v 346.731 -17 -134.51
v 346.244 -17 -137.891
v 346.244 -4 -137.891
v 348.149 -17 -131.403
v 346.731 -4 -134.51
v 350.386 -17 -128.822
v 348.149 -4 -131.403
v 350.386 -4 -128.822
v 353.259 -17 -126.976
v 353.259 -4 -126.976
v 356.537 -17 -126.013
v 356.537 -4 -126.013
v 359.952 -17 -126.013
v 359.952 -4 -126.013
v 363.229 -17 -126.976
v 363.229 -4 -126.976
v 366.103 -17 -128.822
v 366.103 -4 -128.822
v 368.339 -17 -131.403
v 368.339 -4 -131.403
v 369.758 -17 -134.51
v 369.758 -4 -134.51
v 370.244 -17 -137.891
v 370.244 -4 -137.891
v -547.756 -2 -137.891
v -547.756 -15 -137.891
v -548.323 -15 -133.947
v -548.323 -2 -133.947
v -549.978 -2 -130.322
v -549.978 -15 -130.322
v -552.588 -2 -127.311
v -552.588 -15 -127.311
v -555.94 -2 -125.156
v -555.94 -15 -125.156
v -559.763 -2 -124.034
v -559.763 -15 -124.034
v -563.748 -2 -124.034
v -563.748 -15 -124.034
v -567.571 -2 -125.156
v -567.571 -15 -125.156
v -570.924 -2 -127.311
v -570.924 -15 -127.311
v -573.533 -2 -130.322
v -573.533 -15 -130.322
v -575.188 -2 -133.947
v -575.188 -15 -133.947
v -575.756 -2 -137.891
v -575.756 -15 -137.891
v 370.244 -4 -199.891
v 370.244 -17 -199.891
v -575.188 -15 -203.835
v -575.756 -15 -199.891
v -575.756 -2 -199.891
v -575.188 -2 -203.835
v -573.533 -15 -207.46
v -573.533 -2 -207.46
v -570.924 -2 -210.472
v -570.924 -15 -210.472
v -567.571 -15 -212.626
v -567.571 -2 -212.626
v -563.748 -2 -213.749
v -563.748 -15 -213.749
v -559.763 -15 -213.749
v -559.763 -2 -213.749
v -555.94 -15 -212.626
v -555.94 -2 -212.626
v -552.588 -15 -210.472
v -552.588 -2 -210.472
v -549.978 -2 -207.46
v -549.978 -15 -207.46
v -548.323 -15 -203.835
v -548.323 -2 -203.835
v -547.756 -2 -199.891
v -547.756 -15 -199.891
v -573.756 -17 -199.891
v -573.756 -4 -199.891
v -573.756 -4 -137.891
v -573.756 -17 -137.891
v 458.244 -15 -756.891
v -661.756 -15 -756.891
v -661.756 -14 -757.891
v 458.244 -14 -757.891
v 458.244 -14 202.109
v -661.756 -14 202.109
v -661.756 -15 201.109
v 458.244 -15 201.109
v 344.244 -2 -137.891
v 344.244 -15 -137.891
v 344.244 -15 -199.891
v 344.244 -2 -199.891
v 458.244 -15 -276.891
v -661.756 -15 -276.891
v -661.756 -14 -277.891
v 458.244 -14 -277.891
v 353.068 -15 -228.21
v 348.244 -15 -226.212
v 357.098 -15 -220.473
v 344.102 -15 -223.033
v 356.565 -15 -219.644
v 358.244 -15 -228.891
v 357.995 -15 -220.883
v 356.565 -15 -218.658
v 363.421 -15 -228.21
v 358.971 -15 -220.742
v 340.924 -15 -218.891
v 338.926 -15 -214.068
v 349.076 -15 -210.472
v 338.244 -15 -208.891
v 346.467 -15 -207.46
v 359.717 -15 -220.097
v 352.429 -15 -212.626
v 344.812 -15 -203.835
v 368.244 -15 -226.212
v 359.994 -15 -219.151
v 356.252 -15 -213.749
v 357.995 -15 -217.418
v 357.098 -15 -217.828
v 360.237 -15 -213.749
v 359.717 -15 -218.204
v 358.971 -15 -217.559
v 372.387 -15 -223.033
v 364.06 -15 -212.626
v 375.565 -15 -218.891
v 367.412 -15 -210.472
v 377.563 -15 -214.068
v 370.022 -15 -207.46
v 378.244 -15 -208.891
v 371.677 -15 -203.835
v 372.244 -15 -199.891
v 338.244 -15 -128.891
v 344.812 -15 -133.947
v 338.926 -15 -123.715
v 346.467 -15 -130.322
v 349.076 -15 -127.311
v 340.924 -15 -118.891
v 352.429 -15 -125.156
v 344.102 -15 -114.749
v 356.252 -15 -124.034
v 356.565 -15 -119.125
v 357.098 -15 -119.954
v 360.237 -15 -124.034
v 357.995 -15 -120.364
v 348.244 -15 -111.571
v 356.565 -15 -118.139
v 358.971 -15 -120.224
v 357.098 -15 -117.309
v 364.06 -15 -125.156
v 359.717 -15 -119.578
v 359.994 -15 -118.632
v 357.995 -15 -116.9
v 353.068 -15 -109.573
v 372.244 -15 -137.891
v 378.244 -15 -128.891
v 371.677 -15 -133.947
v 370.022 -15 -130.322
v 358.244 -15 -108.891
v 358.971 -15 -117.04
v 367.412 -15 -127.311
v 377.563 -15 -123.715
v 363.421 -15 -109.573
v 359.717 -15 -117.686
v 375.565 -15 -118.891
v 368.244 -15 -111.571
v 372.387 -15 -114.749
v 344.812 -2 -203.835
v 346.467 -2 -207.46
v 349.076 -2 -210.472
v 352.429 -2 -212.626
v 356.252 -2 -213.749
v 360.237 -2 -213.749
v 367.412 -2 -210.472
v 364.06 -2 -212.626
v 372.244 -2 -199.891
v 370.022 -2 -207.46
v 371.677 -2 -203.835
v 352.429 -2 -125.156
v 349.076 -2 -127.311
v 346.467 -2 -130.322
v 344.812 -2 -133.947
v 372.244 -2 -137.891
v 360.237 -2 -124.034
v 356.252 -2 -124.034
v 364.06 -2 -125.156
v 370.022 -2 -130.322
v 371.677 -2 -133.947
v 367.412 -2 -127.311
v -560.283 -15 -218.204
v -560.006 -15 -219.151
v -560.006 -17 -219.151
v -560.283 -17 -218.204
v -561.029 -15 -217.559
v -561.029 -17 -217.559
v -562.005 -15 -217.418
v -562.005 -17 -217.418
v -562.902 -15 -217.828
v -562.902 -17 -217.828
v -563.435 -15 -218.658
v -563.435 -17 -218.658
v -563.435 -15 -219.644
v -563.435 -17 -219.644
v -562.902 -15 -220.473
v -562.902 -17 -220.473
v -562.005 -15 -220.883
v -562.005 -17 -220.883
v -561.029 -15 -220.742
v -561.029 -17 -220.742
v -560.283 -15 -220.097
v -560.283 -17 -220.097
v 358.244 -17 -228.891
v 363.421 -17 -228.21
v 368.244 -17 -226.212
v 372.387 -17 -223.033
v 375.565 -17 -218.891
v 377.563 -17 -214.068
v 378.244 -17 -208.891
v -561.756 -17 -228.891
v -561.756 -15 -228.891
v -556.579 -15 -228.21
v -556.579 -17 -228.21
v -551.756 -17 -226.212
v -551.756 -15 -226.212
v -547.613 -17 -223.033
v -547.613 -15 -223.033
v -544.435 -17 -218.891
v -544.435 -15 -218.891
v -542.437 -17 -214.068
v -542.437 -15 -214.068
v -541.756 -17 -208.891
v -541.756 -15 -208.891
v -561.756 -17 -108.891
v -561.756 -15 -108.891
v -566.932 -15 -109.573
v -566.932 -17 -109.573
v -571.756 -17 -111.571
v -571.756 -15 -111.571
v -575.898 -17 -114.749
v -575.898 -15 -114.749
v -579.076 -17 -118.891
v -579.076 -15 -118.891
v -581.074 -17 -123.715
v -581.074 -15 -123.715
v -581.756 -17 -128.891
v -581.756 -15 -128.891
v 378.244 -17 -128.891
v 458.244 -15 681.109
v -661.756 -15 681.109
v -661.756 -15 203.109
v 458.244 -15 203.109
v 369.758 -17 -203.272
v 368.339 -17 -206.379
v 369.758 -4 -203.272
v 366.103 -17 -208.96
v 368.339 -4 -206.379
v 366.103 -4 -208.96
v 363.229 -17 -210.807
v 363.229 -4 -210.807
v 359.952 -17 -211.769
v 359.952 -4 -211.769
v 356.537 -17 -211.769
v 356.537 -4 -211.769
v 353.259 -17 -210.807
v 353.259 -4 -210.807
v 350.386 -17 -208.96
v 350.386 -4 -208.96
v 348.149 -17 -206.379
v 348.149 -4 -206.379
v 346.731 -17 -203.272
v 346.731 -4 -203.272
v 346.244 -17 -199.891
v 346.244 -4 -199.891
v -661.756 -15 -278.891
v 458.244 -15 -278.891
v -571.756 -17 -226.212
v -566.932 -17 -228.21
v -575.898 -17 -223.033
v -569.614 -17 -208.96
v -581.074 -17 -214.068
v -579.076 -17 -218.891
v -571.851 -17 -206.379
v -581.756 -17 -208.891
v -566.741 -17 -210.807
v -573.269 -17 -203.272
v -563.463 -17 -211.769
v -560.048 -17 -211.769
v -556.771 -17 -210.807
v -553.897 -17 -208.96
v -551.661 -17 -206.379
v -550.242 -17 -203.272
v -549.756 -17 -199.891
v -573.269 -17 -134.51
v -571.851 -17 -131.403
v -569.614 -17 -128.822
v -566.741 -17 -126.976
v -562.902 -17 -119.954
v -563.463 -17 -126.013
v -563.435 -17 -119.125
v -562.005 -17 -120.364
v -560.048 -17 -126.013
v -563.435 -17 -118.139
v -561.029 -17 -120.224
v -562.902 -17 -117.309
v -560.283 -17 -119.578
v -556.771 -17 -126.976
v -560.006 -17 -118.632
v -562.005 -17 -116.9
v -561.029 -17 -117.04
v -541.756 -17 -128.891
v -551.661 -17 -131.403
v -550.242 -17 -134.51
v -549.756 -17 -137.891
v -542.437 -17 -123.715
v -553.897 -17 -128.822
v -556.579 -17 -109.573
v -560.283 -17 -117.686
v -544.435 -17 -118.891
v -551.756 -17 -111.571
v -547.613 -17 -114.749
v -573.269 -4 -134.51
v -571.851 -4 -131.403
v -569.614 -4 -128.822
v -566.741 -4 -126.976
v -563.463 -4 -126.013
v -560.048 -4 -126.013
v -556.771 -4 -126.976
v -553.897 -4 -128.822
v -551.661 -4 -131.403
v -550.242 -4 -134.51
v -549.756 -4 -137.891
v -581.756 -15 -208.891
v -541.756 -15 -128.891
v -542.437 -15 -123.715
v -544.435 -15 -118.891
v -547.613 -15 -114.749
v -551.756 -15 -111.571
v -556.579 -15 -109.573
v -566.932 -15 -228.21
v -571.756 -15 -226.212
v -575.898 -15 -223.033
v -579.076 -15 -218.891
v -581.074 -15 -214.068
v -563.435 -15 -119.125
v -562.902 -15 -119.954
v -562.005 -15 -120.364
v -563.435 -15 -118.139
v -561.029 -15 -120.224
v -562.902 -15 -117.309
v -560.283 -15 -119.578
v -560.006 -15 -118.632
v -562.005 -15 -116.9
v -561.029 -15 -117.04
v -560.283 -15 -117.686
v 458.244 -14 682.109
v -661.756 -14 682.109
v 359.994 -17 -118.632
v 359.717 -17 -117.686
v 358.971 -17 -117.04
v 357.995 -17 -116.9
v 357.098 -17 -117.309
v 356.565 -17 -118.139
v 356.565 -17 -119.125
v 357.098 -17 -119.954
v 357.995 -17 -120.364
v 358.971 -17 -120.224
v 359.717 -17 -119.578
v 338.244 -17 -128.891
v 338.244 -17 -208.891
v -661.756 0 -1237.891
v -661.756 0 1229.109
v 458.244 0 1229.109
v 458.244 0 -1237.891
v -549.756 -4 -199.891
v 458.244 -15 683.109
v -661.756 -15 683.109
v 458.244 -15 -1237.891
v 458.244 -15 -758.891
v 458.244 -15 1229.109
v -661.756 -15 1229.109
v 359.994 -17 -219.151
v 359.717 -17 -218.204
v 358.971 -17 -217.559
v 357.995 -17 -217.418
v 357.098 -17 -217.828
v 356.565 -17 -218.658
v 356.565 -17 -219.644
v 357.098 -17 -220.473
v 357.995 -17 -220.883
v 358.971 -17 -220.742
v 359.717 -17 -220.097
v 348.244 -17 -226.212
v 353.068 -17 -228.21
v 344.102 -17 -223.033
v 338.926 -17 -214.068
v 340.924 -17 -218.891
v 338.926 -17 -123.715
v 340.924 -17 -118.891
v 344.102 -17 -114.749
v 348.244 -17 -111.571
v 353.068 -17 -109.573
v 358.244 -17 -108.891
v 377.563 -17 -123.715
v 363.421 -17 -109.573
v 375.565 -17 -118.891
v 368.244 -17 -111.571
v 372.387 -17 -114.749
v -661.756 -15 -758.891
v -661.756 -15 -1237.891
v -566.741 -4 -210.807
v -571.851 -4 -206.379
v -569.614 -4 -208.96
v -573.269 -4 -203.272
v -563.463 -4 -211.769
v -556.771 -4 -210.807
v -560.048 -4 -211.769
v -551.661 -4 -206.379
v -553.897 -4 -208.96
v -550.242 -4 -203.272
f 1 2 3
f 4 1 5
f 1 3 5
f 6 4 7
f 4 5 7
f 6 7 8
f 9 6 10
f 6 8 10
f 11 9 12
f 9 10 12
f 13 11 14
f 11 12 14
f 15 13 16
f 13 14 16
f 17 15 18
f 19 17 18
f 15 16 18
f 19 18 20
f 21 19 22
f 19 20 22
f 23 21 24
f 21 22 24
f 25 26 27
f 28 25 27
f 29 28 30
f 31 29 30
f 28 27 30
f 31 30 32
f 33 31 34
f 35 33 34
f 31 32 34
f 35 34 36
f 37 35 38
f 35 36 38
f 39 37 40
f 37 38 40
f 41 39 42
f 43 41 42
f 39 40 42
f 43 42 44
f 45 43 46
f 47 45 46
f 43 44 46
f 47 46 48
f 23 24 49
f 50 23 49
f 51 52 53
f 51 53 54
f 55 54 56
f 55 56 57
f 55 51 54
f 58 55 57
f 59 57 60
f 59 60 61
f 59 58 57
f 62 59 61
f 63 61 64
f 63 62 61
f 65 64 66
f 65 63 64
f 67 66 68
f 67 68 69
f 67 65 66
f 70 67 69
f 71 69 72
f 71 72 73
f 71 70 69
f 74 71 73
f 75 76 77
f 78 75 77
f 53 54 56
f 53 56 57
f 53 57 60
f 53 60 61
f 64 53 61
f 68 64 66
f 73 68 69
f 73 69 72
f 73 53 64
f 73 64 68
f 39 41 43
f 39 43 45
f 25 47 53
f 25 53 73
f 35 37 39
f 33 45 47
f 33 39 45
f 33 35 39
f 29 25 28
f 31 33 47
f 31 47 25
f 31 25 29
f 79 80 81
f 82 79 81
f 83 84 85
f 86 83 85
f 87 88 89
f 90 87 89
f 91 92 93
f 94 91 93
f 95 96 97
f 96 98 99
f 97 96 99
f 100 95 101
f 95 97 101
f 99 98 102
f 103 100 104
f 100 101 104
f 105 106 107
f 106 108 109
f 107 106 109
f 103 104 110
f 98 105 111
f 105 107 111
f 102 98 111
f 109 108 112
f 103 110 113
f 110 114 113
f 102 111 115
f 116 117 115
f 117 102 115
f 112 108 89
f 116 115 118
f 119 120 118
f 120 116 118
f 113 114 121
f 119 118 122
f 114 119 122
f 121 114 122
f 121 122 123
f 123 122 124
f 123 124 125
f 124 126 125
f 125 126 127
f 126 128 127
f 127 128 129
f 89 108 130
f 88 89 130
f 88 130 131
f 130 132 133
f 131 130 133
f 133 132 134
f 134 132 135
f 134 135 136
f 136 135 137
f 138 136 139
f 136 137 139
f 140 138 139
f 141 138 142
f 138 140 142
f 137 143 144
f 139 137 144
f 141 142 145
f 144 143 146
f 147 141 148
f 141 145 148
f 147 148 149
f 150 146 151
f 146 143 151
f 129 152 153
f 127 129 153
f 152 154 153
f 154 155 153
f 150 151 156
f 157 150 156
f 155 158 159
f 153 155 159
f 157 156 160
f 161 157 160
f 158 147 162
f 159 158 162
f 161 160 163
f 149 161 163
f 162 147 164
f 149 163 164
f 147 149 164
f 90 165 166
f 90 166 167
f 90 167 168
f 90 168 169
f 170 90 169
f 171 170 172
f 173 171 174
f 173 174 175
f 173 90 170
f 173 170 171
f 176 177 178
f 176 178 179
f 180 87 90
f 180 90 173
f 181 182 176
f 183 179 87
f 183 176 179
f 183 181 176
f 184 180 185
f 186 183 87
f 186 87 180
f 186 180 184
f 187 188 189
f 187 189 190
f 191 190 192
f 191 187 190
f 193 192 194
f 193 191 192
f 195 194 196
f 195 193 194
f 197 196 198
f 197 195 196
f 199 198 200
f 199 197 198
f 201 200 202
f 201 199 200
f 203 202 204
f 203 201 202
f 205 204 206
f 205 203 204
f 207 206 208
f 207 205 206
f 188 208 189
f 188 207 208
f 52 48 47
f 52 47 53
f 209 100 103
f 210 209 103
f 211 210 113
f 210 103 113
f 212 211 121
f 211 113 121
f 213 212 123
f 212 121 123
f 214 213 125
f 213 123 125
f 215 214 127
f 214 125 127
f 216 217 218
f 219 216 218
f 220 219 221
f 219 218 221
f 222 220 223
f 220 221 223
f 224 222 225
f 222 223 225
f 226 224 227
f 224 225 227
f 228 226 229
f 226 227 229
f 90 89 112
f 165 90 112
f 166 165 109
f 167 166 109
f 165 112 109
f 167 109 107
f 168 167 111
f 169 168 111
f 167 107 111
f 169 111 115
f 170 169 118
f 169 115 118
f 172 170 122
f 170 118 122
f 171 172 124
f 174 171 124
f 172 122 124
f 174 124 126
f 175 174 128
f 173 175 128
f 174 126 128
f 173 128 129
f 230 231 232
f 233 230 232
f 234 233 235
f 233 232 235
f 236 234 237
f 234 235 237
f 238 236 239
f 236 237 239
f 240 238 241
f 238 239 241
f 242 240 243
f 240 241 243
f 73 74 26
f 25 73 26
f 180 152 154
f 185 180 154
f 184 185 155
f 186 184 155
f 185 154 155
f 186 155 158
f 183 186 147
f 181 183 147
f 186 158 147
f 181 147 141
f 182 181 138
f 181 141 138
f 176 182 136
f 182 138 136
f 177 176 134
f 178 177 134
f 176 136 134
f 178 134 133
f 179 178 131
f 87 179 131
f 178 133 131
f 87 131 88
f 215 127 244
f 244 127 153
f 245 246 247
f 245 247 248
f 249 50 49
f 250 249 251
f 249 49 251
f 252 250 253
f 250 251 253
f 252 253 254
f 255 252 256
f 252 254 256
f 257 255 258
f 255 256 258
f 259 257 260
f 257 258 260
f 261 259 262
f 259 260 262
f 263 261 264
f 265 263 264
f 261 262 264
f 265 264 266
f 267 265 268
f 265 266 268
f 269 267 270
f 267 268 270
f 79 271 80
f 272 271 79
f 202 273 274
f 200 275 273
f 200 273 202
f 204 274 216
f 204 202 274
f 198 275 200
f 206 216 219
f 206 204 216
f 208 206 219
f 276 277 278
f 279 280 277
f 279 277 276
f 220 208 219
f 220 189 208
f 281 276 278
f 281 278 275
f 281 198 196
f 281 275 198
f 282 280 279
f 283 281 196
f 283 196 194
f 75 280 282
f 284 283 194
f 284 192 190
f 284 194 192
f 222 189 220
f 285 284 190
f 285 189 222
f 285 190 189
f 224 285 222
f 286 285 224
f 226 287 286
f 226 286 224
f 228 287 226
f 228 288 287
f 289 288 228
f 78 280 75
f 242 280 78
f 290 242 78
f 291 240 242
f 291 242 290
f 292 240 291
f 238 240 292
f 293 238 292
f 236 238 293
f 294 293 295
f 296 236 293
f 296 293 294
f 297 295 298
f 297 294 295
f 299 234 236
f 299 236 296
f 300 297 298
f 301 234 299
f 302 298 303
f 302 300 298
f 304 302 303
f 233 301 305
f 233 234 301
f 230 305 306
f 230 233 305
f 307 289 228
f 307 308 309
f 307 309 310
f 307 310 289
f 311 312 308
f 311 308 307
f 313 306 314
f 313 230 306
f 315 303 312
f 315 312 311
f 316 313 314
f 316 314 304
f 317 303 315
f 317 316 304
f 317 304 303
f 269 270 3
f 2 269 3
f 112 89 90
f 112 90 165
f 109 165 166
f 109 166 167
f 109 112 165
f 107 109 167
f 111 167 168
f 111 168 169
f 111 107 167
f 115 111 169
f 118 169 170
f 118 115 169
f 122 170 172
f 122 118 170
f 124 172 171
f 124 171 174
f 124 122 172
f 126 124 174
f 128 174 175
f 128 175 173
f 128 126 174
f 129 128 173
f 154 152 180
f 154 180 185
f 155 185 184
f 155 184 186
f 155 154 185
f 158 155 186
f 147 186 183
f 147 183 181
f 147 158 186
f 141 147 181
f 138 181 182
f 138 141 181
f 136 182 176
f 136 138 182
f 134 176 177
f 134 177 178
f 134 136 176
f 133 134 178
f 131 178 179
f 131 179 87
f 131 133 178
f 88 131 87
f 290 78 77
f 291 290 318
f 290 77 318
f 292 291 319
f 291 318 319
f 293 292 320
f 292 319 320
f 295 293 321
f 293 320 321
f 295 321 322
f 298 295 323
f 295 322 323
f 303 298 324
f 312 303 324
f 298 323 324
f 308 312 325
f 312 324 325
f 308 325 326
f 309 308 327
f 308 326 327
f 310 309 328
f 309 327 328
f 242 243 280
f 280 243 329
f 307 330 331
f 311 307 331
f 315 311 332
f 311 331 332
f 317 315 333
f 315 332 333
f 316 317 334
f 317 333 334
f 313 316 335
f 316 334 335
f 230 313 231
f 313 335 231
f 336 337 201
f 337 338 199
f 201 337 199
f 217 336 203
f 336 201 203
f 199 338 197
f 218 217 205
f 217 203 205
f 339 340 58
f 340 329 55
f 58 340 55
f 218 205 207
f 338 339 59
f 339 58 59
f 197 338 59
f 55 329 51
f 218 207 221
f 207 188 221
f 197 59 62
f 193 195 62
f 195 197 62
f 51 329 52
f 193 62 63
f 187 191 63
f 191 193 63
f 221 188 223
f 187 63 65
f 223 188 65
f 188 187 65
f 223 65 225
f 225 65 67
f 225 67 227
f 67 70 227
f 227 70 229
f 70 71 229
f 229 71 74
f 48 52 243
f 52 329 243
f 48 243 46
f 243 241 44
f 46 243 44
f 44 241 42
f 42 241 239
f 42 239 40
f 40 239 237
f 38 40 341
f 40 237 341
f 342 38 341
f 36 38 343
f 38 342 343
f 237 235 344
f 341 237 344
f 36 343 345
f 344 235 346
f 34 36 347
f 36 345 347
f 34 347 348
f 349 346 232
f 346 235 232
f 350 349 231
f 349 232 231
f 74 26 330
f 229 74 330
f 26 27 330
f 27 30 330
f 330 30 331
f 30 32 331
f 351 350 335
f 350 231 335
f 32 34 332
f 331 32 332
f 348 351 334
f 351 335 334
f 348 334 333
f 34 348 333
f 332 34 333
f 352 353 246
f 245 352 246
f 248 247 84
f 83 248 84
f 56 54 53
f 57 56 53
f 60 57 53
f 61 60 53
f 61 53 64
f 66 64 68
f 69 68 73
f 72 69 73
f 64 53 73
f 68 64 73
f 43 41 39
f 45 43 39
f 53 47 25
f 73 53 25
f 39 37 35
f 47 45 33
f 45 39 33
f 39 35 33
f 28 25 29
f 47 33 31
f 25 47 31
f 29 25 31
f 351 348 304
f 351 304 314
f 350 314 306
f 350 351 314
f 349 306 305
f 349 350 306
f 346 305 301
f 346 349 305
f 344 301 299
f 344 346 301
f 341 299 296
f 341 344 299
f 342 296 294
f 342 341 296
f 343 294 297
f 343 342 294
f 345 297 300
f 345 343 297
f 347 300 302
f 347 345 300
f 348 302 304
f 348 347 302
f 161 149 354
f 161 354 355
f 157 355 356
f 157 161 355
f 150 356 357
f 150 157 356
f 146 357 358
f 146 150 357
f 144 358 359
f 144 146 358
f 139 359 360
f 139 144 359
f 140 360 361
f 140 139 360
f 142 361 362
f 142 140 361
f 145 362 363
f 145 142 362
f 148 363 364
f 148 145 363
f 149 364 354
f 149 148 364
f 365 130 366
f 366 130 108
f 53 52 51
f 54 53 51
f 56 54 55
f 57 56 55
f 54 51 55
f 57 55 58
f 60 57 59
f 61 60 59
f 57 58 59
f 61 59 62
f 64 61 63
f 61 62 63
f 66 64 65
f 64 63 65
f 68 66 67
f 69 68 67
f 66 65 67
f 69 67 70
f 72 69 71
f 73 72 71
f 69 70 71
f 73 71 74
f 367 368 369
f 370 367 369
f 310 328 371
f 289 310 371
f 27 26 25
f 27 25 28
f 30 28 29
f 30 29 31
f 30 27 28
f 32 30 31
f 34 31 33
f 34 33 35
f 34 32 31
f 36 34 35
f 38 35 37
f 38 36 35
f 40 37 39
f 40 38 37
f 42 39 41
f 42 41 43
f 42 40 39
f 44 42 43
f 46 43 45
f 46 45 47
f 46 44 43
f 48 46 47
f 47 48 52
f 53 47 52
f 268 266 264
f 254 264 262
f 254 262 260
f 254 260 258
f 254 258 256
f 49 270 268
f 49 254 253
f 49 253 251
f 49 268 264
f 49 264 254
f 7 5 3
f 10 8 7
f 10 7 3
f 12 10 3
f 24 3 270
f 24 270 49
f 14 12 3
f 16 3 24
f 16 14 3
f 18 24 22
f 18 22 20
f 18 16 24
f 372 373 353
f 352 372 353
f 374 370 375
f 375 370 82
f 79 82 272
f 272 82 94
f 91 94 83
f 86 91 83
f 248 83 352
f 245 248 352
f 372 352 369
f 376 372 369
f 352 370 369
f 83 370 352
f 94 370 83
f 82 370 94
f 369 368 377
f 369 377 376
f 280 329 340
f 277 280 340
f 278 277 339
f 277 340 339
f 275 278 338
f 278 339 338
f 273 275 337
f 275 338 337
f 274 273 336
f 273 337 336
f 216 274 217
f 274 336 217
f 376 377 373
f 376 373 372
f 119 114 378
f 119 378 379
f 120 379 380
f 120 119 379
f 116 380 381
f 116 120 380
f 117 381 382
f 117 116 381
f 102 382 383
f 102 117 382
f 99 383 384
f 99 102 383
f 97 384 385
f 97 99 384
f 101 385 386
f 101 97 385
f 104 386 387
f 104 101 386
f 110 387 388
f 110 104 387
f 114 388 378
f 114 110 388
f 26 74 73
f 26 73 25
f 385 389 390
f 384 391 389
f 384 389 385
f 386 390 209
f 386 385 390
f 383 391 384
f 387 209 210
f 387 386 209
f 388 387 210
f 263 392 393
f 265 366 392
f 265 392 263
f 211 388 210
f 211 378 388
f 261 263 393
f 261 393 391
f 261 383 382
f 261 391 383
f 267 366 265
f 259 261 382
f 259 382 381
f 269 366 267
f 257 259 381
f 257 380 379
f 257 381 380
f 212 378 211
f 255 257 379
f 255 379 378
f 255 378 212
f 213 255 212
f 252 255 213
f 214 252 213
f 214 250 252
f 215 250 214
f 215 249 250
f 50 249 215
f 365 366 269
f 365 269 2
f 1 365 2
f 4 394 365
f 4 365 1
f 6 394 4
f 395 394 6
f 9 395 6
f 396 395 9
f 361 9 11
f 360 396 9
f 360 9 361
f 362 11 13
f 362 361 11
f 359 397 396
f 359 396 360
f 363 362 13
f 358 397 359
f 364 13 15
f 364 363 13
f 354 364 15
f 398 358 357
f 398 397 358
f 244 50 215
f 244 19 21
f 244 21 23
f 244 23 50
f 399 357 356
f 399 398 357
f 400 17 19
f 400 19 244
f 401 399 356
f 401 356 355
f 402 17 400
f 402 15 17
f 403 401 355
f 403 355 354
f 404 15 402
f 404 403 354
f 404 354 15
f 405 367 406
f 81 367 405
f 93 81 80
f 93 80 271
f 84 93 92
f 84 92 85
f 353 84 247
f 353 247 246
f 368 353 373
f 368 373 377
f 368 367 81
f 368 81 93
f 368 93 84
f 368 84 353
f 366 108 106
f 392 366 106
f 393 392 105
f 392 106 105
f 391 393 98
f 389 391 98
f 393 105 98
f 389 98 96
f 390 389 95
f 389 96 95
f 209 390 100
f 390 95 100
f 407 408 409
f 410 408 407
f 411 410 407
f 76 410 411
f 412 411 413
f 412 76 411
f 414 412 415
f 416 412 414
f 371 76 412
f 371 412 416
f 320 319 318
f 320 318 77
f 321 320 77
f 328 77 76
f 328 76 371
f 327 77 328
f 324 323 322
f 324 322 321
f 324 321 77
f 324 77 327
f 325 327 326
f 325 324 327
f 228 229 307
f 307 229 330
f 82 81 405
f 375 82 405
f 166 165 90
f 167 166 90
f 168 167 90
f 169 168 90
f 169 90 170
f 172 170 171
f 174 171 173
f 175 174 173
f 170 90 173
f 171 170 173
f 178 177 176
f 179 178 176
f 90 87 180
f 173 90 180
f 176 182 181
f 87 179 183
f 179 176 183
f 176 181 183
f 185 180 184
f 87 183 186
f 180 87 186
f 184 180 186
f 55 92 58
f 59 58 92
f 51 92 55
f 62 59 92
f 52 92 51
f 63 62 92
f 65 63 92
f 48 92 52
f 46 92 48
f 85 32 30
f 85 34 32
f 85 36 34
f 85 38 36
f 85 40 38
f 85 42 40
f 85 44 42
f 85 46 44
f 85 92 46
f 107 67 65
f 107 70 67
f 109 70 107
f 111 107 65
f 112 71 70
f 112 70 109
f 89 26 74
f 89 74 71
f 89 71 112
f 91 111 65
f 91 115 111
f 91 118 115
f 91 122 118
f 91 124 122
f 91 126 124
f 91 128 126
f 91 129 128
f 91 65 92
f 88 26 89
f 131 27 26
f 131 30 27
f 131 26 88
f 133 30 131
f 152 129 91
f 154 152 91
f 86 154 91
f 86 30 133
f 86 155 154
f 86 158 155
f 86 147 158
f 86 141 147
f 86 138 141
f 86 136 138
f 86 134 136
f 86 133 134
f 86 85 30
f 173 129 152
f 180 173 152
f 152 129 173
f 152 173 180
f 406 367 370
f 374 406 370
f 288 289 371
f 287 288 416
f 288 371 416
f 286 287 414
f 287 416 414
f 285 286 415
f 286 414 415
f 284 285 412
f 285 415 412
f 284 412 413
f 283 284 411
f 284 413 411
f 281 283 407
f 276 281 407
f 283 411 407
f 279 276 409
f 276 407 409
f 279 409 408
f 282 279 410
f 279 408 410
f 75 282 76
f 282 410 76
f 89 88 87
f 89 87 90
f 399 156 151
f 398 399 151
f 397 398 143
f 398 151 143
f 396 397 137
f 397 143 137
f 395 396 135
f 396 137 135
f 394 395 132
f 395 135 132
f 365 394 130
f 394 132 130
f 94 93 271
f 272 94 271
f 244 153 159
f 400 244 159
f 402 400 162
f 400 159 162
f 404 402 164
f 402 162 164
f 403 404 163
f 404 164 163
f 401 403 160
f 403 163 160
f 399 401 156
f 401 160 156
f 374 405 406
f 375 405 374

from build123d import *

# Parameters (mm, degrees)
F0_W      = 1120
F0_H      = 2467
F1_DEPTH  = 15
F3_DEPTH  = 1120.001
F5_DEPTH  = 13
F6_DEPTH  = 13
F7_START  = -11
F7_DEPTH  = 2
F4_R      = 1.75
F8_DEPTH  = 2
F9_DEPTH  = 2
F10_DEPTH = 2


with BuildPart() as f1:
    # F0 (on Front) → F1 (new body)
    with BuildSketch(Plane.XZ):
        with Locations((-101.7555719672, -4.3911735862)):
            Rectangle(F0_W, F0_H)
    extrude(amount=F1_DEPTH)

    # F2 (on face) → F3 (cut, through all)
    with BuildSketch(Plane(origin=(-661.7555719672, 0, 0), x_dir=(0, -1, 0), z_dir=(-1, 0, 0))):
        Polygon((15, -757.8911735862), (15, -756.8911735862), (14, -757.8911735862), (15, -758.8911735862), align=None)
        Polygon((15, 682.1088264138), (15, 683.1088264138), (14, 682.1088264138), (15, 681.1088264138), align=None)
        Polygon((14, -277.8911735862), (15, -278.8911735862), (15, -277.8911735862), (15, -276.8911735862), align=None)
        Polygon((14, 202.1088264138), (15, 201.1088264138), (15, 202.1088264138), (15, 203.1088264138), align=None)
    extrude(amount=-F3_DEPTH, mode=Mode.SUBTRACT)

    # F4 (on face) → F5 (cut)
    with BuildSketch(Plane.XZ.offset(15)):
        with BuildLine():
            Line((372.2444280328, -199.8911735862), (372.2444280328, -137.8911735862))
            ThreePointArc((372.2444280328, -137.8911735862), (358.2444280328, -123.8911735862), (344.2444280328, -137.8911735862))
            Line((344.2444280328, -137.8911735862), (344.2444280328, -199.8911735862))
            ThreePointArc((344.2444280328, -199.8911735862), (358.2444280328, -213.8911735862), (372.2444280328, -199.8911735862))
        make_face()
        with BuildLine():
            ThreePointArc((346.2444280328, -137.8911735862), (358.2444280328, -125.8911735862), (370.2444280328, -137.8911735862))
            Line((370.2444280328, -137.8911735862), (370.2444280328, -199.8911735862))
            ThreePointArc((370.2444280328, -199.8911735862), (358.2444280328, -211.8911735862), (346.2444280328, -199.8911735862))
            Line((346.2444280328, -199.8911735862), (346.2444280328, -137.8911735862))
        make_face(mode=Mode.SUBTRACT)
        with BuildLine():
            Line((-547.7555719672, -199.8911735862), (-547.7555719672, -137.8911735862))
            ThreePointArc((-547.7555719672, -137.8911735862), (-561.7555719672, -123.8911735862), (-575.7555719672, -137.8911735862))
            Line((-575.7555719672, -137.8911735862), (-575.7555719672, -199.8911735862))
            ThreePointArc((-575.7555719672, -199.8911735862), (-561.7555719672, -213.8911735862), (-547.7555719672, -199.8911735862))
        make_face()
        with BuildLine():
            ThreePointArc((-573.7555719672, -137.8911735862), (-561.7555719672, -125.8911735862), (-549.7555719672, -137.8911735862))
            Line((-549.7555719672, -137.8911735862), (-549.7555719672, -199.8911735862))
            ThreePointArc((-549.7555719672, -199.8911735862), (-561.7555719672, -211.8911735862), (-573.7555719672, -199.8911735862))
            Line((-573.7555719672, -199.8911735862), (-573.7555719672, -137.8911735862))
        make_face(mode=Mode.SUBTRACT)
        with BuildLine():
            Line((370.2444280328, -199.8911735862), (370.2444280328, -137.8911735862))
            ThreePointArc((370.2444280328, -137.8911735862), (358.2444280328, -125.8911735862), (346.2444280328, -137.8911735862))
            Line((346.2444280328, -137.8911735862), (346.2444280328, -199.8911735862))
            ThreePointArc((346.2444280328, -199.8911735862), (358.2444280328, -211.8911735862), (370.2444280328, -199.8911735862))
        make_face()
        with BuildLine():
            Line((-549.7555719672, -199.8911735862), (-549.7555719672, -137.8911735862))
            ThreePointArc((-549.7555719672, -137.8911735862), (-561.7555719672, -125.8911735862), (-573.7555719672, -137.8911735862))
            Line((-573.7555719672, -137.8911735862), (-573.7555719672, -199.8911735862))
            ThreePointArc((-573.7555719672, -199.8911735862), (-561.7555719672, -211.8911735862), (-549.7555719672, -199.8911735862))
        make_face()
    extrude(amount=-F5_DEPTH, mode=Mode.SUBTRACT)


with BuildPart() as f6:
    # F4 (on face) → F6 (new body)
    with BuildSketch(Plane.XZ.offset(15)):
        with BuildLine():
            Line((372.2444280328, -199.8911735862), (372.2444280328, -137.8911735862))
            ThreePointArc((372.2444280328, -137.8911735862), (358.2444280328, -123.8911735862), (344.2444280328, -137.8911735862))
            Line((344.2444280328, -137.8911735862), (344.2444280328, -199.8911735862))
            ThreePointArc((344.2444280328, -199.8911735862), (358.2444280328, -213.8911735862), (372.2444280328, -199.8911735862))
        make_face()
        with BuildLine():
            ThreePointArc((346.2444280328, -137.8911735862), (358.2444280328, -125.8911735862), (370.2444280328, -137.8911735862))
            Line((370.2444280328, -137.8911735862), (370.2444280328, -199.8911735862))
            ThreePointArc((370.2444280328, -199.8911735862), (358.2444280328, -211.8911735862), (346.2444280328, -199.8911735862))
            Line((346.2444280328, -199.8911735862), (346.2444280328, -137.8911735862))
        make_face(mode=Mode.SUBTRACT)
    extrude(amount=-F6_DEPTH)

    # F4 (on face) → F7 (join)
    with BuildSketch(Plane.XZ.offset(15).offset(F7_START)):
        with BuildLine():
            Line((370.2444280328, -199.8911735862), (370.2444280328, -137.8911735862))
            ThreePointArc((370.2444280328, -137.8911735862), (358.2444280328, -125.8911735862), (346.2444280328, -137.8911735862))
            Line((346.2444280328, -137.8911735862), (346.2444280328, -199.8911735862))
            ThreePointArc((346.2444280328, -199.8911735862), (358.2444280328, -211.8911735862), (370.2444280328, -199.8911735862))
        make_face()
    extrude(amount=-F7_DEPTH)

    # F4 (on face) → F8 (join)
    with BuildSketch(Plane.XZ.offset(15)):
        with BuildLine():
            Line((338.2444280328, -128.8911735862), (338.2444280328, -168.8911735862))
            Line((338.2444280328, -168.8911735862), (338.2444280328, -208.8911735862))
            ThreePointArc((338.2444280328, -208.8911735862), (344.1022924091, -223.03330921), (358.2444280328, -228.8911735862))
            ThreePointArc((358.2444280328, -228.8911735862), (372.3865636565, -223.03330921), (378.2444280328, -208.8911735862))
            Line((378.2444280328, -208.8911735862), (378.2444280328, -168.8911735862))
            Line((378.2444280328, -168.8911735862), (378.2444280328, -128.8911735862))
            ThreePointArc((378.2444280328, -128.8911735862), (372.3865636565, -114.7490379625), (358.2444280328, -108.8911735862))
            ThreePointArc((358.2444280328, -108.8911735862), (344.1022924091, -114.7490379625), (338.2444280328, -128.8911735862))
        make_face()
        with Locations((358.2444280328, -219.1505849063)):
            Circle(F4_R, mode=Mode.SUBTRACT)
        with BuildLine():
            ThreePointArc((344.2444280328, -137.8911735862), (358.2444280328, -123.8911735862), (372.2444280328, -137.8911735862))
            Line((372.2444280328, -137.8911735862), (372.2444280328, -199.8911735862))
            ThreePointArc((372.2444280328, -199.8911735862), (358.2444280328, -213.8911735862), (344.2444280328, -199.8911735862))
            Line((344.2444280328, -199.8911735862), (344.2444280328, -137.8911735862))
        make_face(mode=Mode.SUBTRACT)
        with Locations((358.2444280328, -118.6317622662)):
            Circle(F4_R, mode=Mode.SUBTRACT)
        with BuildLine():
            Line((372.2444280328, -199.8911735862), (372.2444280328, -137.8911735862))
            ThreePointArc((372.2444280328, -137.8911735862), (358.2444280328, -123.8911735862), (344.2444280328, -137.8911735862))
            Line((344.2444280328, -137.8911735862), (344.2444280328, -199.8911735862))
            ThreePointArc((344.2444280328, -199.8911735862), (358.2444280328, -213.8911735862), (372.2444280328, -199.8911735862))
        make_face()
        with BuildLine():
            ThreePointArc((346.2444280328, -137.8911735862), (358.2444280328, -125.8911735862), (370.2444280328, -137.8911735862))
            Line((370.2444280328, -137.8911735862), (370.2444280328, -199.8911735862))
            ThreePointArc((370.2444280328, -199.8911735862), (358.2444280328, -211.8911735862), (346.2444280328, -199.8911735862))
            Line((346.2444280328, -199.8911735862), (346.2444280328, -137.8911735862))
        make_face(mode=Mode.SUBTRACT)
    extrude(amount=F8_DEPTH)


with BuildPart() as f6b:
    # F4 (on face) → F6, piece 2 (new body)
    with BuildSketch(Plane.XZ.offset(15)):
        with BuildLine():
            Line((-547.7555719672, -199.8911735862), (-547.7555719672, -137.8911735862))
            ThreePointArc((-547.7555719672, -137.8911735862), (-561.7555719672, -123.8911735862), (-575.7555719672, -137.8911735862))
            Line((-575.7555719672, -137.8911735862), (-575.7555719672, -199.8911735862))
            ThreePointArc((-575.7555719672, -199.8911735862), (-561.7555719672, -213.8911735862), (-547.7555719672, -199.8911735862))
        make_face()
        with BuildLine():
            ThreePointArc((-573.7555719672, -137.8911735862), (-561.7555719672, -125.8911735862), (-549.7555719672, -137.8911735862))
            Line((-549.7555719672, -137.8911735862), (-549.7555719672, -199.8911735862))
            ThreePointArc((-549.7555719672, -199.8911735862), (-561.7555719672, -211.8911735862), (-573.7555719672, -199.8911735862))
            Line((-573.7555719672, -199.8911735862), (-573.7555719672, -137.8911735862))
        make_face(mode=Mode.SUBTRACT)
    extrude(amount=-F6_DEPTH)

    # F9 (add): a face of the model
    f9_faces = [f1.part.faces().sort_by_distance(p)[0] for p in [
        (-561.7555719672, -2, -168.8911735862),
    ]]
    extrude(f9_faces, amount=F9_DEPTH)

    # F4 (on face) → F10 (join)
    with BuildSketch(Plane.XZ.offset(15)):
        with BuildLine():
            Line((-581.7555719672, -128.8911735862), (-581.7555719672, -168.8911735862))
            Line((-581.7555719672, -168.8911735862), (-581.7555719672, -208.8911735862))
            ThreePointArc((-581.7555719672, -208.8911735862), (-575.8977075909, -223.03330921), (-561.7555719672, -228.8911735862))
            ThreePointArc((-561.7555719672, -228.8911735862), (-547.6134363435, -223.03330921), (-541.7555719672, -208.8911735862))
            Line((-541.7555719672, -208.8911735862), (-541.7555719672, -168.8911735862))
            Line((-541.7555719672, -168.8911735862), (-541.7555719672, -128.8911735862))
            ThreePointArc((-541.7555719672, -128.8911735862), (-547.6134363435, -114.7490379625), (-561.7555719672, -108.8911735862))
            ThreePointArc((-561.7555719672, -108.8911735862), (-575.8977075909, -114.7490379625), (-581.7555719672, -128.8911735862))
        make_face()
        with Locations((-561.7555719672, -219.1505849063)):
            Circle(F4_R, mode=Mode.SUBTRACT)
        with BuildLine():
            ThreePointArc((-575.7555719672, -137.8911735862), (-561.7555719672, -123.8911735862), (-547.7555719672, -137.8911735862))
            Line((-547.7555719672, -137.8911735862), (-547.7555719672, -199.8911735862))
            ThreePointArc((-547.7555719672, -199.8911735862), (-561.7555719672, -213.8911735862), (-575.7555719672, -199.8911735862))
            Line((-575.7555719672, -199.8911735862), (-575.7555719672, -137.8911735862))
        make_face(mode=Mode.SUBTRACT)
        with Locations((-561.7555719672, -118.6317622662)):
            Circle(F4_R, mode=Mode.SUBTRACT)
        with BuildLine():
            Line((-547.7555719672, -199.8911735862), (-547.7555719672, -137.8911735862))
            ThreePointArc((-547.7555719672, -137.8911735862), (-561.7555719672, -123.8911735862), (-575.7555719672, -137.8911735862))
            Line((-575.7555719672, -137.8911735862), (-575.7555719672, -199.8911735862))
            ThreePointArc((-575.7555719672, -199.8911735862), (-561.7555719672, -213.8911735862), (-547.7555719672, -199.8911735862))
        make_face()
        with BuildLine():
            ThreePointArc((-573.7555719672, -137.8911735862), (-561.7555719672, -125.8911735862), (-549.7555719672, -137.8911735862))
            Line((-549.7555719672, -137.8911735862), (-549.7555719672, -199.8911735862))
            ThreePointArc((-549.7555719672, -199.8911735862), (-561.7555719672, -211.8911735862), (-573.7555719672, -199.8911735862))
            Line((-573.7555719672, -199.8911735862), (-573.7555719672, -137.8911735862))
        make_face(mode=Mode.SUBTRACT)
    extrude(amount=F10_DEPTH)


solid = Compound([f1.part, f6.part, f6b.part])
